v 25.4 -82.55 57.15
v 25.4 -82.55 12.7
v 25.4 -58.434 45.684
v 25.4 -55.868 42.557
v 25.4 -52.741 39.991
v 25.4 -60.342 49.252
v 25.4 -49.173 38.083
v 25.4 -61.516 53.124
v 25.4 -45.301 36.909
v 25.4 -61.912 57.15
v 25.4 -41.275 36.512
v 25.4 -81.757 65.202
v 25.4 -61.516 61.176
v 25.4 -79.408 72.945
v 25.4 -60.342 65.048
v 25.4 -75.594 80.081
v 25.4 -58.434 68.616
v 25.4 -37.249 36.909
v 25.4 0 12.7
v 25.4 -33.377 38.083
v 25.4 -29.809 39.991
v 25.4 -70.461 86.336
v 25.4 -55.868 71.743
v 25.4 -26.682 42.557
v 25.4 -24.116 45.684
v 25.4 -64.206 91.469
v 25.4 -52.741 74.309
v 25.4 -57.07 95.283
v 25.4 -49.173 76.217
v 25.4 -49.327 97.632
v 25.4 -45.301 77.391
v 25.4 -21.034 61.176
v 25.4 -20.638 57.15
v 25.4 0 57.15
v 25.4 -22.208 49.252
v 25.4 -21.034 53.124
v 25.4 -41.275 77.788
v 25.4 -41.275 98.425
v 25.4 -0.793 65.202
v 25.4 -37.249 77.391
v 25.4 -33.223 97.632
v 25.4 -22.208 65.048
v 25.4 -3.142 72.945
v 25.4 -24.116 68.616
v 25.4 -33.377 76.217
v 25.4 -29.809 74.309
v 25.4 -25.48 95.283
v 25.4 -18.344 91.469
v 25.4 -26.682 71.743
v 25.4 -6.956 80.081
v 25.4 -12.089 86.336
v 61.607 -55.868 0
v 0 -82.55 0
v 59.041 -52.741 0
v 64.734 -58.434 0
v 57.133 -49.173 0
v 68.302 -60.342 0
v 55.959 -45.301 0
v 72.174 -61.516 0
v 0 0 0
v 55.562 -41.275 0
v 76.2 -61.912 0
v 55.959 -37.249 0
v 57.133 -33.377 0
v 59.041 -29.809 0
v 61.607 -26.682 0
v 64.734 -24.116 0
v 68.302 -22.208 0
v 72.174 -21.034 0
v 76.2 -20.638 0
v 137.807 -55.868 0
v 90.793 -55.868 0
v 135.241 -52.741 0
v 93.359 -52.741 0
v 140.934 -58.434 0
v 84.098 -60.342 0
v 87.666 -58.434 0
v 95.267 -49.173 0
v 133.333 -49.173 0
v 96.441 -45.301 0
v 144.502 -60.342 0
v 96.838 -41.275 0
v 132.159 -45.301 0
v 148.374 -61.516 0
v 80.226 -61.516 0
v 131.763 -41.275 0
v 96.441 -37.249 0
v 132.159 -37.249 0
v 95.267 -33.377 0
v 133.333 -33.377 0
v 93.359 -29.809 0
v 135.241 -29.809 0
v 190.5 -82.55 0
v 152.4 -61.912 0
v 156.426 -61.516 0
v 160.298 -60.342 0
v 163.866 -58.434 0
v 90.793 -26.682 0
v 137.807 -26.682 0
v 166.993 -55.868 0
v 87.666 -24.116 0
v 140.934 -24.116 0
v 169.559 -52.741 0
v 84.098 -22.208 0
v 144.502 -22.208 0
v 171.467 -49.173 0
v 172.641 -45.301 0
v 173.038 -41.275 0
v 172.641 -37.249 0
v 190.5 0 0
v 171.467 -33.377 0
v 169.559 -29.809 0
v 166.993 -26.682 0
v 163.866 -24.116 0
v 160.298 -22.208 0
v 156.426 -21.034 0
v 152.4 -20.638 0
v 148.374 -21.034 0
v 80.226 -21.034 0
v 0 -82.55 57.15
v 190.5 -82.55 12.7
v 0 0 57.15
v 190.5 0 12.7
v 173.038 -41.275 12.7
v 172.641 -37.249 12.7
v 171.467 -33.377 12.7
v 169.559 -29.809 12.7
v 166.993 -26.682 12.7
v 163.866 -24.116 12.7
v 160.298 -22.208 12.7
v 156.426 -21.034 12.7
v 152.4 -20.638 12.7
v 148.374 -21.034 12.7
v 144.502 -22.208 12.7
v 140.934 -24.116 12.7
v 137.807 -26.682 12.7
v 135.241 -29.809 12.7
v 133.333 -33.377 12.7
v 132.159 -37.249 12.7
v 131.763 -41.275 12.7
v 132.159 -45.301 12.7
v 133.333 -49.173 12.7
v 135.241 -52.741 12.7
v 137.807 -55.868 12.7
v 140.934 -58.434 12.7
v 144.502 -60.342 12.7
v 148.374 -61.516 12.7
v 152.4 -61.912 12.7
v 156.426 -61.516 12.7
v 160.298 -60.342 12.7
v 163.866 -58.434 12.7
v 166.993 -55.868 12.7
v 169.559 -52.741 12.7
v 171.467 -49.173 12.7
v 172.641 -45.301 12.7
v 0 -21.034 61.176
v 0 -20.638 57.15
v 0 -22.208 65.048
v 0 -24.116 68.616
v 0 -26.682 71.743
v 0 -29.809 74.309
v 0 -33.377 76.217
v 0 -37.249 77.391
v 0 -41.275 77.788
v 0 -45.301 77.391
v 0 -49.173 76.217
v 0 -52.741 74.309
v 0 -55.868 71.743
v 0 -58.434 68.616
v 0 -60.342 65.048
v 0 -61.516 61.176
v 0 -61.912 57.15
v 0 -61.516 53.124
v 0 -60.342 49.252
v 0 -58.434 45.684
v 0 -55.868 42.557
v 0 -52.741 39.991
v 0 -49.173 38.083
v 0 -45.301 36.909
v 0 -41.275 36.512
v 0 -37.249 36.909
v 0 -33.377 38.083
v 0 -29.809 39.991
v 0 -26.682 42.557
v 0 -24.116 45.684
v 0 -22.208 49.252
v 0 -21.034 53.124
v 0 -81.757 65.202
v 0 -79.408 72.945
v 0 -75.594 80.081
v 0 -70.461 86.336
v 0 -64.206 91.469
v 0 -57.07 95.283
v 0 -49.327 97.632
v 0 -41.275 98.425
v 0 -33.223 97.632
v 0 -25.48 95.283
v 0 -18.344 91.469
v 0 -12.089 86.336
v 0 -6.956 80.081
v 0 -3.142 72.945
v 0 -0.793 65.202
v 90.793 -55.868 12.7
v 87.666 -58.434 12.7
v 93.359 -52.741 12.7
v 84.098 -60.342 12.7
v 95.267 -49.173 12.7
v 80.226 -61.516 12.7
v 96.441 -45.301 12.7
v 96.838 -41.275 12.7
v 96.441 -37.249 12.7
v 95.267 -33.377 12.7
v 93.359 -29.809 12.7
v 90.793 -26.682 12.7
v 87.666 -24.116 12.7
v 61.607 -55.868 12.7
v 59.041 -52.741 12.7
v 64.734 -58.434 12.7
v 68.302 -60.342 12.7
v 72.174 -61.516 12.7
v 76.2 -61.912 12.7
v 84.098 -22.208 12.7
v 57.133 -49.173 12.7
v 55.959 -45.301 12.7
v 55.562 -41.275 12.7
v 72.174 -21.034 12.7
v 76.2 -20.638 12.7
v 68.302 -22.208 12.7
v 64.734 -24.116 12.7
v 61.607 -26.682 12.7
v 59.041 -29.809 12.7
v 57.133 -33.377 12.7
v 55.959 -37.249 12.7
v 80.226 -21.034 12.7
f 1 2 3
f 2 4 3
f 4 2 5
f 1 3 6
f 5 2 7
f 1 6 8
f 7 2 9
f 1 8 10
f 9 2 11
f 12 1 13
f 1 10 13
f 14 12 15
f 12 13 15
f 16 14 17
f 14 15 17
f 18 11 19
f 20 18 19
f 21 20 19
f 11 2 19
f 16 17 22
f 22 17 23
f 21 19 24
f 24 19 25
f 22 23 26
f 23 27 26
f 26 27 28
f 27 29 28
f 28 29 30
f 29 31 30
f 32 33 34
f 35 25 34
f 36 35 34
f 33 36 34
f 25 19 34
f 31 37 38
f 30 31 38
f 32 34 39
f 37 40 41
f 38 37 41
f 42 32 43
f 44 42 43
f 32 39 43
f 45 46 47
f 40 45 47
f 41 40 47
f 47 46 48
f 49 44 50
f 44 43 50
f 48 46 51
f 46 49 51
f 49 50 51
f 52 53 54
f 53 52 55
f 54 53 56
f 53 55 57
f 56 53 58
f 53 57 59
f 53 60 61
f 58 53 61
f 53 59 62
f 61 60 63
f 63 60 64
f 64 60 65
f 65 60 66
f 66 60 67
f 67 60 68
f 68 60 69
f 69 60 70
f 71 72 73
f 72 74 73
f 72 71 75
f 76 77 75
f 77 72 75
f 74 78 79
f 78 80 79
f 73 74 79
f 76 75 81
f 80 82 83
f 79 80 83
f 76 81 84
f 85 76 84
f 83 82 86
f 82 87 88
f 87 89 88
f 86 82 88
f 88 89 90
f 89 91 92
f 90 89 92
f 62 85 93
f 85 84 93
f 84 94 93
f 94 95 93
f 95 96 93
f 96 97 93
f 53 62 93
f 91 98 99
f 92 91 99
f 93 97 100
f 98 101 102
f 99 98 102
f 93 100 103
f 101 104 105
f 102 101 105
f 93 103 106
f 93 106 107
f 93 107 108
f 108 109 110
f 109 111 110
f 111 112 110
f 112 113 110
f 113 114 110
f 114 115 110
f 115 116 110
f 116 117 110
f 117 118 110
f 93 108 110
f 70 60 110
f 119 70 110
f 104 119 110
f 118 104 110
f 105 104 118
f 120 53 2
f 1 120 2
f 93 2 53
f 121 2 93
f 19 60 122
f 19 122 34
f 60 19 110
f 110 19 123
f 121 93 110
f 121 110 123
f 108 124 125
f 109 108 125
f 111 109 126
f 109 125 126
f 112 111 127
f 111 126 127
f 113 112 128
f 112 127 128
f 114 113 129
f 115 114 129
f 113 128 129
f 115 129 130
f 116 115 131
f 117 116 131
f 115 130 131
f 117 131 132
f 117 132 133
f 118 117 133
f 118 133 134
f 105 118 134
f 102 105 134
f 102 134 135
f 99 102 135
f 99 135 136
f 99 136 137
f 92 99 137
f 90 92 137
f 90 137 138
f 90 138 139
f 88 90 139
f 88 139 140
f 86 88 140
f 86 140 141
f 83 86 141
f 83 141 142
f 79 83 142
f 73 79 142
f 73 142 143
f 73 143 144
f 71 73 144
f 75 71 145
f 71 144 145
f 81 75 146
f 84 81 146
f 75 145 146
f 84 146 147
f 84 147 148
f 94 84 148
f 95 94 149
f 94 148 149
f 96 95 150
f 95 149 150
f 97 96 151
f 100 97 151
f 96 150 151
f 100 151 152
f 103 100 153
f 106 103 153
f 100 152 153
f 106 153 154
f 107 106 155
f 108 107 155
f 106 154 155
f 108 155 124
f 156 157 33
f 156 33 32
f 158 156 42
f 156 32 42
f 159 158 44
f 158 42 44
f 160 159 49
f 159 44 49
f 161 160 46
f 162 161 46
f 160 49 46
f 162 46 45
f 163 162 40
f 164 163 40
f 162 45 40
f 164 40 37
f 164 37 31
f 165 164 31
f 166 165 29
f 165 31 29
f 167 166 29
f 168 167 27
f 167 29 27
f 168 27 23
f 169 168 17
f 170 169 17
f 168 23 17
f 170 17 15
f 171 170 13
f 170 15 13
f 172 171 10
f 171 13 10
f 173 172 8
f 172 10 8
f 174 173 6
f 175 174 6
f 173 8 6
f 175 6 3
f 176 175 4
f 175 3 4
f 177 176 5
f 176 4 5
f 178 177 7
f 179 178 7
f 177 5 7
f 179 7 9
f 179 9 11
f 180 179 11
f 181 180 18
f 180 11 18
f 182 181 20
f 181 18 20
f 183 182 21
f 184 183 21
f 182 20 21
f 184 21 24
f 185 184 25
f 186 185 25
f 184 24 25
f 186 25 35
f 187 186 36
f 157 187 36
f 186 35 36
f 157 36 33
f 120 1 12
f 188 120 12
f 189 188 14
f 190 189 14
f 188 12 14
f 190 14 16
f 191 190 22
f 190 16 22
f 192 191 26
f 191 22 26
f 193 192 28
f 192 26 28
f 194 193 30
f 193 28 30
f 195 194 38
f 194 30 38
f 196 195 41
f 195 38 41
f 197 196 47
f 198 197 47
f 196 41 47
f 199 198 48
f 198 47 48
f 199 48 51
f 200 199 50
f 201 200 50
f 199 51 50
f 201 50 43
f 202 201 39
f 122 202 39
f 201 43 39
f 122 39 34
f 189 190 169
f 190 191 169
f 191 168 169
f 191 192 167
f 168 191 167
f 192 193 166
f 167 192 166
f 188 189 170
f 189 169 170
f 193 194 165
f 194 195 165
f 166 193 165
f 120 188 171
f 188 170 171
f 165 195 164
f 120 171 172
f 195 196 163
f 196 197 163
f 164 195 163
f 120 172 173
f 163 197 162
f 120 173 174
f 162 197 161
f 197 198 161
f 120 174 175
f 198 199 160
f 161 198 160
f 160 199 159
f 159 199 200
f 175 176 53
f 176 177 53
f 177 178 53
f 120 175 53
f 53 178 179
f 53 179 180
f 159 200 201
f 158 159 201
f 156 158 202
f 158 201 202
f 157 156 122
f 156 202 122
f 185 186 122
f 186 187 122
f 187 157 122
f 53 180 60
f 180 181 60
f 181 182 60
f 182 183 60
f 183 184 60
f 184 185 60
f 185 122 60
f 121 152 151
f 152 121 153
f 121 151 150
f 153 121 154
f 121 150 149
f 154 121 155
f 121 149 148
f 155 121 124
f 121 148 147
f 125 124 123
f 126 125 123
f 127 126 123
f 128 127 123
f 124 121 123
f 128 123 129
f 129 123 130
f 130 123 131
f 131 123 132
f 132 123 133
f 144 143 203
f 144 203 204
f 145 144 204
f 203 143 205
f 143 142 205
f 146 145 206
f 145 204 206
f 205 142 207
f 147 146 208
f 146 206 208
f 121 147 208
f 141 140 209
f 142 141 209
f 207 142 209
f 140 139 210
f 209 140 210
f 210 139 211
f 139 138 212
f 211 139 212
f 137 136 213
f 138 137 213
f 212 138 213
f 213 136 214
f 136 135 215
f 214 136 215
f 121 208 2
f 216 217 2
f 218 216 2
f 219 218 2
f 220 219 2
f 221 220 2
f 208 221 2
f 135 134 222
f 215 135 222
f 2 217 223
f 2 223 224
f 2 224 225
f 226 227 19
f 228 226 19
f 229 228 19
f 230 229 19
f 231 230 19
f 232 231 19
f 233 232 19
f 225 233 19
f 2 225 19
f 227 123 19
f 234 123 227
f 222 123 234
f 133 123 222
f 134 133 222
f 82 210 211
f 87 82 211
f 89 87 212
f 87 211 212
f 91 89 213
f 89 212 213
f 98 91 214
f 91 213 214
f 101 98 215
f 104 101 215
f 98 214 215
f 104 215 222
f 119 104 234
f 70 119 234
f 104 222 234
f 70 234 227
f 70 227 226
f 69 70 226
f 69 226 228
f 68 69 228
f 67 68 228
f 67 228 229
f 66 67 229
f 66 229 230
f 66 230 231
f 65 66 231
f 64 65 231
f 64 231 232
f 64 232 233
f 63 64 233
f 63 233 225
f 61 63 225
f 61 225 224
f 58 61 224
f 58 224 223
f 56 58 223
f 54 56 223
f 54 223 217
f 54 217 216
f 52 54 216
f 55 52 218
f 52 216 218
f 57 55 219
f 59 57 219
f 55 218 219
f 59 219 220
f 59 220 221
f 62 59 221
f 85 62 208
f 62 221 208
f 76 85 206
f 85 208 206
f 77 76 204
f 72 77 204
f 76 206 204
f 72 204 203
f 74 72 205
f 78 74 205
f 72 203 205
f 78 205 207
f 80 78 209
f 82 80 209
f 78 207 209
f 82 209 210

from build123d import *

# Parameters (mm, degrees)
F1_DEPTH = 82.55
F3_DEPTH = 25.4
F4_R     = 20.6375
F5_DEPTH = 25.4
F6_R     = 20.6375
F7_DEPTH = 25.4


with BuildPart() as f1:
    # F0 (on Front) → F1 (new body)
    with BuildSketch(Plane.XZ):
        Polygon((0, 114.3), (0, 0), (190.5, 0), (190.5, 12.7), (25.4, 12.7), (25.4, 114.3), align=None)
    extrude(amount=F1_DEPTH)

    # F2 (on face) → F3 (cut)
    with BuildSketch(Plane.YZ.offset(25.4)):
        with BuildLine():
            ThreePointArc((-82.55, 57.15), (-41.275, 98.425), (0, 57.15))
            Line((0, 57.15), (0, 114.3))
            Line((0, 114.3), (-82.55, 114.3))
            Line((-82.55, 114.3), (-82.55, 57.15))
        make_face()
    extrude(amount=-F3_DEPTH, mode=Mode.SUBTRACT)

    # F4 (on face) → F5 (cut, through all)
    with BuildSketch(Plane.YZ.offset(25.4)):
        with Locations((-41.275, 57.15)):
            Circle(F4_R)
    extrude(amount=-F5_DEPTH, mode=Mode.SUBTRACT)

    # F6 (on face) → F7 (cut)
    with BuildSketch(Plane.XY.offset(12.7)):
        with Locations((76.2, -41.275)):
            Circle(F6_R)
        with Locations((152.4, -41.275)):
            Circle(F6_R)
    extrude(amount=-F7_DEPTH, mode=Mode.SUBTRACT)


solid = f1.part
